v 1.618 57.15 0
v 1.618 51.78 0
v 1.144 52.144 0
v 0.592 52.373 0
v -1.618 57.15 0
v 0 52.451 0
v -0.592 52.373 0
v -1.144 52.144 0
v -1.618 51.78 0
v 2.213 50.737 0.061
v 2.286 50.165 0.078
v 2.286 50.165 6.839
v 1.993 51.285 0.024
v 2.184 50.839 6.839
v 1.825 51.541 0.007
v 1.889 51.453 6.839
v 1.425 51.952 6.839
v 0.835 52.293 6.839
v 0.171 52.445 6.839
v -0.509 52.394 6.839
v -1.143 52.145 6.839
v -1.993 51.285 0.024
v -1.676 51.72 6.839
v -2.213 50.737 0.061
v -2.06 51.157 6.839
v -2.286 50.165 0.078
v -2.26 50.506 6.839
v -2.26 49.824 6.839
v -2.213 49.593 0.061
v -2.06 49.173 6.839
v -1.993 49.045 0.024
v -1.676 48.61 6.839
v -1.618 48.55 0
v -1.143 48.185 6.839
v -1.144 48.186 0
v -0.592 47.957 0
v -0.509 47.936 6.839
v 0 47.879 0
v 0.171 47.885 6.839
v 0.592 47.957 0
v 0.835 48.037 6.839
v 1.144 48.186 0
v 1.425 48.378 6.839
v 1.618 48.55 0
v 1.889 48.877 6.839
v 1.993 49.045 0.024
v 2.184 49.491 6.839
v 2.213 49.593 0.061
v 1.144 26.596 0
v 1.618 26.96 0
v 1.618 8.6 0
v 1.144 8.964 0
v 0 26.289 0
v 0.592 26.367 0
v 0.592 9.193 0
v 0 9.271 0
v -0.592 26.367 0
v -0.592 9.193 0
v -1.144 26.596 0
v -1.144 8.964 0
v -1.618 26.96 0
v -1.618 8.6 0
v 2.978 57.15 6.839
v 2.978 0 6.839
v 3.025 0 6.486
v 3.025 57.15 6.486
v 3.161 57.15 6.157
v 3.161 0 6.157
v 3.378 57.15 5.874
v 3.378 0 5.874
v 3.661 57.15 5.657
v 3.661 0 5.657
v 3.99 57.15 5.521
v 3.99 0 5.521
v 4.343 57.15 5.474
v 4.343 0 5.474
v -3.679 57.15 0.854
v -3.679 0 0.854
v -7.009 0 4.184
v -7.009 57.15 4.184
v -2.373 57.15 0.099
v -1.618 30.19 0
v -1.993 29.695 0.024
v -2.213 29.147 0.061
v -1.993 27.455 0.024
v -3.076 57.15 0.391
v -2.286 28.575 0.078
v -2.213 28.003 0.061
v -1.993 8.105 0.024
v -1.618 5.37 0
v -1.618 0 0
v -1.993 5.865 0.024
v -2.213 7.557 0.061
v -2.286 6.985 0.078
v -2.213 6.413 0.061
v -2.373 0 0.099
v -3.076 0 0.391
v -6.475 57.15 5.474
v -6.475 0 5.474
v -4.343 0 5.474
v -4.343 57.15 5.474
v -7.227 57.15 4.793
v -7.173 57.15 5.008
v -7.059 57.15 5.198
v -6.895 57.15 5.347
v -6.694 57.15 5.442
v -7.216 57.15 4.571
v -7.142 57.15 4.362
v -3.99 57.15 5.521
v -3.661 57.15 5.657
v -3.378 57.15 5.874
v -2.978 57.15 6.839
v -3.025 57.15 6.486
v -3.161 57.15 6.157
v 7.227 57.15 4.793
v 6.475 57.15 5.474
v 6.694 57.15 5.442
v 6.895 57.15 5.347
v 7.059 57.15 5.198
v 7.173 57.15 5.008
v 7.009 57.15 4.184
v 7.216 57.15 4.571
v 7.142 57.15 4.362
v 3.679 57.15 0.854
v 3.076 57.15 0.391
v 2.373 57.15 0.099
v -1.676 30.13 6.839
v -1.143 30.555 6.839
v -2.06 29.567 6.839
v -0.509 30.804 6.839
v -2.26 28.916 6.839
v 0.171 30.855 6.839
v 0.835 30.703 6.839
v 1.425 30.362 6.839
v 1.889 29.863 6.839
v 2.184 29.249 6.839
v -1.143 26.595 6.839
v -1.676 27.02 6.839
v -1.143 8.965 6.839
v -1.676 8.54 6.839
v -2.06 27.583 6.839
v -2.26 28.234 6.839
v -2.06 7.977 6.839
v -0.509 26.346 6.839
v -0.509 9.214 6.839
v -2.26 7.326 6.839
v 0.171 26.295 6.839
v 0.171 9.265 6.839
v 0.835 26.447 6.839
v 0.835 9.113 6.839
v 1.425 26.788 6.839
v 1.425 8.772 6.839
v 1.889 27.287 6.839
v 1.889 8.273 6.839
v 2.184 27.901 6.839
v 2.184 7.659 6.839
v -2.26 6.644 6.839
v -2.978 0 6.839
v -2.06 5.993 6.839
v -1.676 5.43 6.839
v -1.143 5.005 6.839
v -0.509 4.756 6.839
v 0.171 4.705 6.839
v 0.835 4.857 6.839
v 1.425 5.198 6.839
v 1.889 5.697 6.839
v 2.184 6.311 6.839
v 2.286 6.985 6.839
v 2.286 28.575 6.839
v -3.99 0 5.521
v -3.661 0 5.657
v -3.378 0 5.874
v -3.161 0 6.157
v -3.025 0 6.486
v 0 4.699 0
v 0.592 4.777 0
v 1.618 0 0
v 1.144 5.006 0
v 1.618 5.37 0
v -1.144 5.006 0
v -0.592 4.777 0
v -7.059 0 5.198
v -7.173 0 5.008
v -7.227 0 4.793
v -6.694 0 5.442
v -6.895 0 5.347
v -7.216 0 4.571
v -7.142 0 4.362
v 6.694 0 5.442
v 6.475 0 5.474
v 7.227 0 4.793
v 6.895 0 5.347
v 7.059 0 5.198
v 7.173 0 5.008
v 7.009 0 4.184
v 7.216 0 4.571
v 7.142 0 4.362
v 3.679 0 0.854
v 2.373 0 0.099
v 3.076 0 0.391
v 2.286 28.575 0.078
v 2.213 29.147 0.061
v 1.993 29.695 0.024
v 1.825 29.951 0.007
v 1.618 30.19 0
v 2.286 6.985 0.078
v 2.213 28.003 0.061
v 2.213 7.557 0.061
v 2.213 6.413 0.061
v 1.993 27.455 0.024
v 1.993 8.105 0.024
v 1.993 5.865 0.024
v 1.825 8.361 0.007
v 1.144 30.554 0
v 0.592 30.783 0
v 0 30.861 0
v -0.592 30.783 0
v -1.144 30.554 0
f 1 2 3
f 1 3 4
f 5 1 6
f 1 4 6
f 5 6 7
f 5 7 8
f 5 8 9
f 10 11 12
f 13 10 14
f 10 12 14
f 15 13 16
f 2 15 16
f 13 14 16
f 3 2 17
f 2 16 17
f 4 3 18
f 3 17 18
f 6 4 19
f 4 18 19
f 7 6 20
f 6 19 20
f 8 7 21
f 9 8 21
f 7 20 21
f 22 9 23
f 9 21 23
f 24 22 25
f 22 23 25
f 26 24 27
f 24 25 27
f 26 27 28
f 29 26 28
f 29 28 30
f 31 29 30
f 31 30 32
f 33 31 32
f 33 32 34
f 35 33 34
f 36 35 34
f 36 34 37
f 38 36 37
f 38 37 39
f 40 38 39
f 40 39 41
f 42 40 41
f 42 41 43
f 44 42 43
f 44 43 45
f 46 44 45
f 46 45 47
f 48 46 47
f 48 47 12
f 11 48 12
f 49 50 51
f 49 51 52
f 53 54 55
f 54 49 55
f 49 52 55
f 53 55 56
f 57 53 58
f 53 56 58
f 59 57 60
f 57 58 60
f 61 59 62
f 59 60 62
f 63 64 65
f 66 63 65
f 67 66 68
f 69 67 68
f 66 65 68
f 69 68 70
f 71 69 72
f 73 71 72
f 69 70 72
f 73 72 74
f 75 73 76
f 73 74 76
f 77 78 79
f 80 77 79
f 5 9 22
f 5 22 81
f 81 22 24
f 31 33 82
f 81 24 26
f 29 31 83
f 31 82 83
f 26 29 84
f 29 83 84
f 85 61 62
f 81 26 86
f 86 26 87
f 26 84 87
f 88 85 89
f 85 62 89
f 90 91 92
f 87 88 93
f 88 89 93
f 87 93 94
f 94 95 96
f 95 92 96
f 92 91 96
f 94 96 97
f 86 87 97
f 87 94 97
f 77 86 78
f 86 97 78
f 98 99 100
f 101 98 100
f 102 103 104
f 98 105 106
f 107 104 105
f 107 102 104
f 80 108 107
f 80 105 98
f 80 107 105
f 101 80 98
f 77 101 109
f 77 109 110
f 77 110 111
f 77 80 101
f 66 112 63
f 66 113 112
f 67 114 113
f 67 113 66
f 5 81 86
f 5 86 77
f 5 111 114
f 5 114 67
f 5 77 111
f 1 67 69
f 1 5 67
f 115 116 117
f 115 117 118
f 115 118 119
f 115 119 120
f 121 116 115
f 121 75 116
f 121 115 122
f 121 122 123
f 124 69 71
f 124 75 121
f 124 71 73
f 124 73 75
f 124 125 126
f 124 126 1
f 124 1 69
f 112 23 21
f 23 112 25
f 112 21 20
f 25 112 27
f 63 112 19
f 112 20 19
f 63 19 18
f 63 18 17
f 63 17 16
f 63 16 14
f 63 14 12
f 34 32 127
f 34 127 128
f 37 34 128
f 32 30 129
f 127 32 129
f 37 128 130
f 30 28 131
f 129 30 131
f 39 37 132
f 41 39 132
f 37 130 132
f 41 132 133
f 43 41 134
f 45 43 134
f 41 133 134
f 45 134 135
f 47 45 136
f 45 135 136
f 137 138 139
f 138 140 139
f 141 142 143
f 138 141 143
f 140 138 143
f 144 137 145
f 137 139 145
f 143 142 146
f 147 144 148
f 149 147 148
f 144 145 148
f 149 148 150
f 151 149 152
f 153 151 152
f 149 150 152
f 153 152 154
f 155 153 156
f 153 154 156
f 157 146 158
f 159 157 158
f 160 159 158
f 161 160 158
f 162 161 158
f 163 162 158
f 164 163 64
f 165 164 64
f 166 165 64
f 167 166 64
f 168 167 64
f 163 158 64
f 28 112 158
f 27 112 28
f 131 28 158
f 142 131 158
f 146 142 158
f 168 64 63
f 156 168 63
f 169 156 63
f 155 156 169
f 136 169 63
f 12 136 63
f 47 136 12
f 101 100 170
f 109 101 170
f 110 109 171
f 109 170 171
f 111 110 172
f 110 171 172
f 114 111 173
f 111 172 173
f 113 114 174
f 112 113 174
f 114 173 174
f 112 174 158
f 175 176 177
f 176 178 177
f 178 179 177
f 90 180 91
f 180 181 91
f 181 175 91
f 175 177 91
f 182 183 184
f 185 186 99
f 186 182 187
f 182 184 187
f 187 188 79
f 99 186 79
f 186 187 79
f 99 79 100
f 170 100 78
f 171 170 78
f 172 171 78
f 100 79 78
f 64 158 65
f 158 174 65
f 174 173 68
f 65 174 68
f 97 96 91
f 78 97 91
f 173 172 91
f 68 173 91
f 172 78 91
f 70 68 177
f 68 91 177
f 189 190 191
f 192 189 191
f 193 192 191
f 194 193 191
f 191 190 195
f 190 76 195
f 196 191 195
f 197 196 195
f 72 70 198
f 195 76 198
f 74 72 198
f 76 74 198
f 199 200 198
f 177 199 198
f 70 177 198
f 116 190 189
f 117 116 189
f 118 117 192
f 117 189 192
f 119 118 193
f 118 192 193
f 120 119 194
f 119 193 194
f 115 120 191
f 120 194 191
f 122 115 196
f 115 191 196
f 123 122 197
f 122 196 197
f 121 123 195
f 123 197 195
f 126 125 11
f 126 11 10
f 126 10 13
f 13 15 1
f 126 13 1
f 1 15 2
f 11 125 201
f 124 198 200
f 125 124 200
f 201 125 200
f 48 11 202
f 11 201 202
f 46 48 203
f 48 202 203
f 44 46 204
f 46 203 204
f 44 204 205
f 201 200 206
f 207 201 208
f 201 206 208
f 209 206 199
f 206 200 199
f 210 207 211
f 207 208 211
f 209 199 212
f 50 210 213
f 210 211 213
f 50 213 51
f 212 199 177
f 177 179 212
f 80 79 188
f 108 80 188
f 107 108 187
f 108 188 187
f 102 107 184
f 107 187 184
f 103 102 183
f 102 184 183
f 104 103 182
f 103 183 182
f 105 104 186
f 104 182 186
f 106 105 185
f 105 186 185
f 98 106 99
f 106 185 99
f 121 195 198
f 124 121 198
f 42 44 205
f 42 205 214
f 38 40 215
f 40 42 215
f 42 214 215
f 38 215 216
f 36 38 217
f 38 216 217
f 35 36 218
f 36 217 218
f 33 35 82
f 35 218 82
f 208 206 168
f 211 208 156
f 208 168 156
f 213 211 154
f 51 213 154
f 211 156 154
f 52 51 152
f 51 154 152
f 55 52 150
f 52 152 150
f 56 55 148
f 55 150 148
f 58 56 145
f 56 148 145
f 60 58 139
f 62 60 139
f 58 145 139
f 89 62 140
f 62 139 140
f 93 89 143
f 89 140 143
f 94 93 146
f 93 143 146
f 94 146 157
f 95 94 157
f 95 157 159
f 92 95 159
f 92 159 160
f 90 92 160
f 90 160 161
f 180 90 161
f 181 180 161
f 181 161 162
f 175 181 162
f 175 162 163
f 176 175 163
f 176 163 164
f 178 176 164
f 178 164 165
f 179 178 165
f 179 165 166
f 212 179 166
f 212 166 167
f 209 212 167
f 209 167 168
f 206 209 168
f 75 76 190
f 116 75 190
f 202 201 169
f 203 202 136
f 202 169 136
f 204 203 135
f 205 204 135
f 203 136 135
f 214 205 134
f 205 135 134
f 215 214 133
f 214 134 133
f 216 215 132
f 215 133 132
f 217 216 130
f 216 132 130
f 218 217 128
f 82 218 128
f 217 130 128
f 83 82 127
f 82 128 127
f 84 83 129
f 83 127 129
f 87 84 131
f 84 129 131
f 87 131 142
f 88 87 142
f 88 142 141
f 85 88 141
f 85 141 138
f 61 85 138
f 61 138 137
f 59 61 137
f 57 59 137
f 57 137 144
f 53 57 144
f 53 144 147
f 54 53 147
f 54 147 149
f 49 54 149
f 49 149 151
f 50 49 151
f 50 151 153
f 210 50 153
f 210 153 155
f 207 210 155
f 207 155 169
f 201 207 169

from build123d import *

# Parameters (mm, degrees)
BOSS_EXTRUDE1_DEPTH = 57.15
SKETCH2_R           = 2.286
CUT_EXTRUDE1_DEPTH  = 7.8393


with BuildPart() as part:
    # Sketch1 → Boss-Extrude1 (new body)
    with BuildSketch(Plane(origin=(0, 0, 0), x_dir=(1, 0, 0), z_dir=(0, 1, 0))):
        with BuildLine():
            Line((-2.9785, -6.8393), (2.978499971, -6.8393))
            ThreePointArc((2.978499971, -6.8393), (3.378269925, -5.874169954), (4.343399971, -5.4744))
            Line((4.343399971, -5.4744), (6.474794456, -5.4744))
            ThreePointArc((6.474794456, -5.4744), (7.173247382, -5.007708675), (7.009367182, -4.183827273))
            Line((7.009367182, -4.183827273), (3.679323642, -0.853783733))
            ThreePointArc((3.679323642, -0.853783733), (2.73362958, -0.221891163), (1.618107374, 0))
            Line((1.618107374, 0), (-1.618107374, 0))
            ThreePointArc((-1.618107374, 0), (-2.73362958, -0.221891163), (-3.679323642, -0.853783733))
            Line((-3.679323642, -0.853783733), (-7.009367182, -4.183827273))
            ThreePointArc((-7.009367182, -4.183827273), (-7.173247382, -5.007708675), (-6.474794456, -5.4744))
            Line((-6.474794456, -5.4744), (-4.3434, -5.4744))
            ThreePointArc((-4.3434, -5.4744), (-3.378269954, -5.874169954), (-2.9785, -6.8393))
        make_face()
    extrude(amount=BOSS_EXTRUDE1_DEPTH)

    # Sketch2 → Cut-Extrude1 (cut, through all)
    with BuildSketch(Plane.XY.offset(6.8393)):
        with Locations((0, 50.165)):
            Circle(SKETCH2_R)
        with Locations((0, 28.575)):
            Circle(SKETCH2_R)
        with Locations((0, 6.985)):
            Circle(SKETCH2_R)
    extrude(amount=-CUT_EXTRUDE1_DEPTH, mode=Mode.SUBTRACT)


solid = part.part
